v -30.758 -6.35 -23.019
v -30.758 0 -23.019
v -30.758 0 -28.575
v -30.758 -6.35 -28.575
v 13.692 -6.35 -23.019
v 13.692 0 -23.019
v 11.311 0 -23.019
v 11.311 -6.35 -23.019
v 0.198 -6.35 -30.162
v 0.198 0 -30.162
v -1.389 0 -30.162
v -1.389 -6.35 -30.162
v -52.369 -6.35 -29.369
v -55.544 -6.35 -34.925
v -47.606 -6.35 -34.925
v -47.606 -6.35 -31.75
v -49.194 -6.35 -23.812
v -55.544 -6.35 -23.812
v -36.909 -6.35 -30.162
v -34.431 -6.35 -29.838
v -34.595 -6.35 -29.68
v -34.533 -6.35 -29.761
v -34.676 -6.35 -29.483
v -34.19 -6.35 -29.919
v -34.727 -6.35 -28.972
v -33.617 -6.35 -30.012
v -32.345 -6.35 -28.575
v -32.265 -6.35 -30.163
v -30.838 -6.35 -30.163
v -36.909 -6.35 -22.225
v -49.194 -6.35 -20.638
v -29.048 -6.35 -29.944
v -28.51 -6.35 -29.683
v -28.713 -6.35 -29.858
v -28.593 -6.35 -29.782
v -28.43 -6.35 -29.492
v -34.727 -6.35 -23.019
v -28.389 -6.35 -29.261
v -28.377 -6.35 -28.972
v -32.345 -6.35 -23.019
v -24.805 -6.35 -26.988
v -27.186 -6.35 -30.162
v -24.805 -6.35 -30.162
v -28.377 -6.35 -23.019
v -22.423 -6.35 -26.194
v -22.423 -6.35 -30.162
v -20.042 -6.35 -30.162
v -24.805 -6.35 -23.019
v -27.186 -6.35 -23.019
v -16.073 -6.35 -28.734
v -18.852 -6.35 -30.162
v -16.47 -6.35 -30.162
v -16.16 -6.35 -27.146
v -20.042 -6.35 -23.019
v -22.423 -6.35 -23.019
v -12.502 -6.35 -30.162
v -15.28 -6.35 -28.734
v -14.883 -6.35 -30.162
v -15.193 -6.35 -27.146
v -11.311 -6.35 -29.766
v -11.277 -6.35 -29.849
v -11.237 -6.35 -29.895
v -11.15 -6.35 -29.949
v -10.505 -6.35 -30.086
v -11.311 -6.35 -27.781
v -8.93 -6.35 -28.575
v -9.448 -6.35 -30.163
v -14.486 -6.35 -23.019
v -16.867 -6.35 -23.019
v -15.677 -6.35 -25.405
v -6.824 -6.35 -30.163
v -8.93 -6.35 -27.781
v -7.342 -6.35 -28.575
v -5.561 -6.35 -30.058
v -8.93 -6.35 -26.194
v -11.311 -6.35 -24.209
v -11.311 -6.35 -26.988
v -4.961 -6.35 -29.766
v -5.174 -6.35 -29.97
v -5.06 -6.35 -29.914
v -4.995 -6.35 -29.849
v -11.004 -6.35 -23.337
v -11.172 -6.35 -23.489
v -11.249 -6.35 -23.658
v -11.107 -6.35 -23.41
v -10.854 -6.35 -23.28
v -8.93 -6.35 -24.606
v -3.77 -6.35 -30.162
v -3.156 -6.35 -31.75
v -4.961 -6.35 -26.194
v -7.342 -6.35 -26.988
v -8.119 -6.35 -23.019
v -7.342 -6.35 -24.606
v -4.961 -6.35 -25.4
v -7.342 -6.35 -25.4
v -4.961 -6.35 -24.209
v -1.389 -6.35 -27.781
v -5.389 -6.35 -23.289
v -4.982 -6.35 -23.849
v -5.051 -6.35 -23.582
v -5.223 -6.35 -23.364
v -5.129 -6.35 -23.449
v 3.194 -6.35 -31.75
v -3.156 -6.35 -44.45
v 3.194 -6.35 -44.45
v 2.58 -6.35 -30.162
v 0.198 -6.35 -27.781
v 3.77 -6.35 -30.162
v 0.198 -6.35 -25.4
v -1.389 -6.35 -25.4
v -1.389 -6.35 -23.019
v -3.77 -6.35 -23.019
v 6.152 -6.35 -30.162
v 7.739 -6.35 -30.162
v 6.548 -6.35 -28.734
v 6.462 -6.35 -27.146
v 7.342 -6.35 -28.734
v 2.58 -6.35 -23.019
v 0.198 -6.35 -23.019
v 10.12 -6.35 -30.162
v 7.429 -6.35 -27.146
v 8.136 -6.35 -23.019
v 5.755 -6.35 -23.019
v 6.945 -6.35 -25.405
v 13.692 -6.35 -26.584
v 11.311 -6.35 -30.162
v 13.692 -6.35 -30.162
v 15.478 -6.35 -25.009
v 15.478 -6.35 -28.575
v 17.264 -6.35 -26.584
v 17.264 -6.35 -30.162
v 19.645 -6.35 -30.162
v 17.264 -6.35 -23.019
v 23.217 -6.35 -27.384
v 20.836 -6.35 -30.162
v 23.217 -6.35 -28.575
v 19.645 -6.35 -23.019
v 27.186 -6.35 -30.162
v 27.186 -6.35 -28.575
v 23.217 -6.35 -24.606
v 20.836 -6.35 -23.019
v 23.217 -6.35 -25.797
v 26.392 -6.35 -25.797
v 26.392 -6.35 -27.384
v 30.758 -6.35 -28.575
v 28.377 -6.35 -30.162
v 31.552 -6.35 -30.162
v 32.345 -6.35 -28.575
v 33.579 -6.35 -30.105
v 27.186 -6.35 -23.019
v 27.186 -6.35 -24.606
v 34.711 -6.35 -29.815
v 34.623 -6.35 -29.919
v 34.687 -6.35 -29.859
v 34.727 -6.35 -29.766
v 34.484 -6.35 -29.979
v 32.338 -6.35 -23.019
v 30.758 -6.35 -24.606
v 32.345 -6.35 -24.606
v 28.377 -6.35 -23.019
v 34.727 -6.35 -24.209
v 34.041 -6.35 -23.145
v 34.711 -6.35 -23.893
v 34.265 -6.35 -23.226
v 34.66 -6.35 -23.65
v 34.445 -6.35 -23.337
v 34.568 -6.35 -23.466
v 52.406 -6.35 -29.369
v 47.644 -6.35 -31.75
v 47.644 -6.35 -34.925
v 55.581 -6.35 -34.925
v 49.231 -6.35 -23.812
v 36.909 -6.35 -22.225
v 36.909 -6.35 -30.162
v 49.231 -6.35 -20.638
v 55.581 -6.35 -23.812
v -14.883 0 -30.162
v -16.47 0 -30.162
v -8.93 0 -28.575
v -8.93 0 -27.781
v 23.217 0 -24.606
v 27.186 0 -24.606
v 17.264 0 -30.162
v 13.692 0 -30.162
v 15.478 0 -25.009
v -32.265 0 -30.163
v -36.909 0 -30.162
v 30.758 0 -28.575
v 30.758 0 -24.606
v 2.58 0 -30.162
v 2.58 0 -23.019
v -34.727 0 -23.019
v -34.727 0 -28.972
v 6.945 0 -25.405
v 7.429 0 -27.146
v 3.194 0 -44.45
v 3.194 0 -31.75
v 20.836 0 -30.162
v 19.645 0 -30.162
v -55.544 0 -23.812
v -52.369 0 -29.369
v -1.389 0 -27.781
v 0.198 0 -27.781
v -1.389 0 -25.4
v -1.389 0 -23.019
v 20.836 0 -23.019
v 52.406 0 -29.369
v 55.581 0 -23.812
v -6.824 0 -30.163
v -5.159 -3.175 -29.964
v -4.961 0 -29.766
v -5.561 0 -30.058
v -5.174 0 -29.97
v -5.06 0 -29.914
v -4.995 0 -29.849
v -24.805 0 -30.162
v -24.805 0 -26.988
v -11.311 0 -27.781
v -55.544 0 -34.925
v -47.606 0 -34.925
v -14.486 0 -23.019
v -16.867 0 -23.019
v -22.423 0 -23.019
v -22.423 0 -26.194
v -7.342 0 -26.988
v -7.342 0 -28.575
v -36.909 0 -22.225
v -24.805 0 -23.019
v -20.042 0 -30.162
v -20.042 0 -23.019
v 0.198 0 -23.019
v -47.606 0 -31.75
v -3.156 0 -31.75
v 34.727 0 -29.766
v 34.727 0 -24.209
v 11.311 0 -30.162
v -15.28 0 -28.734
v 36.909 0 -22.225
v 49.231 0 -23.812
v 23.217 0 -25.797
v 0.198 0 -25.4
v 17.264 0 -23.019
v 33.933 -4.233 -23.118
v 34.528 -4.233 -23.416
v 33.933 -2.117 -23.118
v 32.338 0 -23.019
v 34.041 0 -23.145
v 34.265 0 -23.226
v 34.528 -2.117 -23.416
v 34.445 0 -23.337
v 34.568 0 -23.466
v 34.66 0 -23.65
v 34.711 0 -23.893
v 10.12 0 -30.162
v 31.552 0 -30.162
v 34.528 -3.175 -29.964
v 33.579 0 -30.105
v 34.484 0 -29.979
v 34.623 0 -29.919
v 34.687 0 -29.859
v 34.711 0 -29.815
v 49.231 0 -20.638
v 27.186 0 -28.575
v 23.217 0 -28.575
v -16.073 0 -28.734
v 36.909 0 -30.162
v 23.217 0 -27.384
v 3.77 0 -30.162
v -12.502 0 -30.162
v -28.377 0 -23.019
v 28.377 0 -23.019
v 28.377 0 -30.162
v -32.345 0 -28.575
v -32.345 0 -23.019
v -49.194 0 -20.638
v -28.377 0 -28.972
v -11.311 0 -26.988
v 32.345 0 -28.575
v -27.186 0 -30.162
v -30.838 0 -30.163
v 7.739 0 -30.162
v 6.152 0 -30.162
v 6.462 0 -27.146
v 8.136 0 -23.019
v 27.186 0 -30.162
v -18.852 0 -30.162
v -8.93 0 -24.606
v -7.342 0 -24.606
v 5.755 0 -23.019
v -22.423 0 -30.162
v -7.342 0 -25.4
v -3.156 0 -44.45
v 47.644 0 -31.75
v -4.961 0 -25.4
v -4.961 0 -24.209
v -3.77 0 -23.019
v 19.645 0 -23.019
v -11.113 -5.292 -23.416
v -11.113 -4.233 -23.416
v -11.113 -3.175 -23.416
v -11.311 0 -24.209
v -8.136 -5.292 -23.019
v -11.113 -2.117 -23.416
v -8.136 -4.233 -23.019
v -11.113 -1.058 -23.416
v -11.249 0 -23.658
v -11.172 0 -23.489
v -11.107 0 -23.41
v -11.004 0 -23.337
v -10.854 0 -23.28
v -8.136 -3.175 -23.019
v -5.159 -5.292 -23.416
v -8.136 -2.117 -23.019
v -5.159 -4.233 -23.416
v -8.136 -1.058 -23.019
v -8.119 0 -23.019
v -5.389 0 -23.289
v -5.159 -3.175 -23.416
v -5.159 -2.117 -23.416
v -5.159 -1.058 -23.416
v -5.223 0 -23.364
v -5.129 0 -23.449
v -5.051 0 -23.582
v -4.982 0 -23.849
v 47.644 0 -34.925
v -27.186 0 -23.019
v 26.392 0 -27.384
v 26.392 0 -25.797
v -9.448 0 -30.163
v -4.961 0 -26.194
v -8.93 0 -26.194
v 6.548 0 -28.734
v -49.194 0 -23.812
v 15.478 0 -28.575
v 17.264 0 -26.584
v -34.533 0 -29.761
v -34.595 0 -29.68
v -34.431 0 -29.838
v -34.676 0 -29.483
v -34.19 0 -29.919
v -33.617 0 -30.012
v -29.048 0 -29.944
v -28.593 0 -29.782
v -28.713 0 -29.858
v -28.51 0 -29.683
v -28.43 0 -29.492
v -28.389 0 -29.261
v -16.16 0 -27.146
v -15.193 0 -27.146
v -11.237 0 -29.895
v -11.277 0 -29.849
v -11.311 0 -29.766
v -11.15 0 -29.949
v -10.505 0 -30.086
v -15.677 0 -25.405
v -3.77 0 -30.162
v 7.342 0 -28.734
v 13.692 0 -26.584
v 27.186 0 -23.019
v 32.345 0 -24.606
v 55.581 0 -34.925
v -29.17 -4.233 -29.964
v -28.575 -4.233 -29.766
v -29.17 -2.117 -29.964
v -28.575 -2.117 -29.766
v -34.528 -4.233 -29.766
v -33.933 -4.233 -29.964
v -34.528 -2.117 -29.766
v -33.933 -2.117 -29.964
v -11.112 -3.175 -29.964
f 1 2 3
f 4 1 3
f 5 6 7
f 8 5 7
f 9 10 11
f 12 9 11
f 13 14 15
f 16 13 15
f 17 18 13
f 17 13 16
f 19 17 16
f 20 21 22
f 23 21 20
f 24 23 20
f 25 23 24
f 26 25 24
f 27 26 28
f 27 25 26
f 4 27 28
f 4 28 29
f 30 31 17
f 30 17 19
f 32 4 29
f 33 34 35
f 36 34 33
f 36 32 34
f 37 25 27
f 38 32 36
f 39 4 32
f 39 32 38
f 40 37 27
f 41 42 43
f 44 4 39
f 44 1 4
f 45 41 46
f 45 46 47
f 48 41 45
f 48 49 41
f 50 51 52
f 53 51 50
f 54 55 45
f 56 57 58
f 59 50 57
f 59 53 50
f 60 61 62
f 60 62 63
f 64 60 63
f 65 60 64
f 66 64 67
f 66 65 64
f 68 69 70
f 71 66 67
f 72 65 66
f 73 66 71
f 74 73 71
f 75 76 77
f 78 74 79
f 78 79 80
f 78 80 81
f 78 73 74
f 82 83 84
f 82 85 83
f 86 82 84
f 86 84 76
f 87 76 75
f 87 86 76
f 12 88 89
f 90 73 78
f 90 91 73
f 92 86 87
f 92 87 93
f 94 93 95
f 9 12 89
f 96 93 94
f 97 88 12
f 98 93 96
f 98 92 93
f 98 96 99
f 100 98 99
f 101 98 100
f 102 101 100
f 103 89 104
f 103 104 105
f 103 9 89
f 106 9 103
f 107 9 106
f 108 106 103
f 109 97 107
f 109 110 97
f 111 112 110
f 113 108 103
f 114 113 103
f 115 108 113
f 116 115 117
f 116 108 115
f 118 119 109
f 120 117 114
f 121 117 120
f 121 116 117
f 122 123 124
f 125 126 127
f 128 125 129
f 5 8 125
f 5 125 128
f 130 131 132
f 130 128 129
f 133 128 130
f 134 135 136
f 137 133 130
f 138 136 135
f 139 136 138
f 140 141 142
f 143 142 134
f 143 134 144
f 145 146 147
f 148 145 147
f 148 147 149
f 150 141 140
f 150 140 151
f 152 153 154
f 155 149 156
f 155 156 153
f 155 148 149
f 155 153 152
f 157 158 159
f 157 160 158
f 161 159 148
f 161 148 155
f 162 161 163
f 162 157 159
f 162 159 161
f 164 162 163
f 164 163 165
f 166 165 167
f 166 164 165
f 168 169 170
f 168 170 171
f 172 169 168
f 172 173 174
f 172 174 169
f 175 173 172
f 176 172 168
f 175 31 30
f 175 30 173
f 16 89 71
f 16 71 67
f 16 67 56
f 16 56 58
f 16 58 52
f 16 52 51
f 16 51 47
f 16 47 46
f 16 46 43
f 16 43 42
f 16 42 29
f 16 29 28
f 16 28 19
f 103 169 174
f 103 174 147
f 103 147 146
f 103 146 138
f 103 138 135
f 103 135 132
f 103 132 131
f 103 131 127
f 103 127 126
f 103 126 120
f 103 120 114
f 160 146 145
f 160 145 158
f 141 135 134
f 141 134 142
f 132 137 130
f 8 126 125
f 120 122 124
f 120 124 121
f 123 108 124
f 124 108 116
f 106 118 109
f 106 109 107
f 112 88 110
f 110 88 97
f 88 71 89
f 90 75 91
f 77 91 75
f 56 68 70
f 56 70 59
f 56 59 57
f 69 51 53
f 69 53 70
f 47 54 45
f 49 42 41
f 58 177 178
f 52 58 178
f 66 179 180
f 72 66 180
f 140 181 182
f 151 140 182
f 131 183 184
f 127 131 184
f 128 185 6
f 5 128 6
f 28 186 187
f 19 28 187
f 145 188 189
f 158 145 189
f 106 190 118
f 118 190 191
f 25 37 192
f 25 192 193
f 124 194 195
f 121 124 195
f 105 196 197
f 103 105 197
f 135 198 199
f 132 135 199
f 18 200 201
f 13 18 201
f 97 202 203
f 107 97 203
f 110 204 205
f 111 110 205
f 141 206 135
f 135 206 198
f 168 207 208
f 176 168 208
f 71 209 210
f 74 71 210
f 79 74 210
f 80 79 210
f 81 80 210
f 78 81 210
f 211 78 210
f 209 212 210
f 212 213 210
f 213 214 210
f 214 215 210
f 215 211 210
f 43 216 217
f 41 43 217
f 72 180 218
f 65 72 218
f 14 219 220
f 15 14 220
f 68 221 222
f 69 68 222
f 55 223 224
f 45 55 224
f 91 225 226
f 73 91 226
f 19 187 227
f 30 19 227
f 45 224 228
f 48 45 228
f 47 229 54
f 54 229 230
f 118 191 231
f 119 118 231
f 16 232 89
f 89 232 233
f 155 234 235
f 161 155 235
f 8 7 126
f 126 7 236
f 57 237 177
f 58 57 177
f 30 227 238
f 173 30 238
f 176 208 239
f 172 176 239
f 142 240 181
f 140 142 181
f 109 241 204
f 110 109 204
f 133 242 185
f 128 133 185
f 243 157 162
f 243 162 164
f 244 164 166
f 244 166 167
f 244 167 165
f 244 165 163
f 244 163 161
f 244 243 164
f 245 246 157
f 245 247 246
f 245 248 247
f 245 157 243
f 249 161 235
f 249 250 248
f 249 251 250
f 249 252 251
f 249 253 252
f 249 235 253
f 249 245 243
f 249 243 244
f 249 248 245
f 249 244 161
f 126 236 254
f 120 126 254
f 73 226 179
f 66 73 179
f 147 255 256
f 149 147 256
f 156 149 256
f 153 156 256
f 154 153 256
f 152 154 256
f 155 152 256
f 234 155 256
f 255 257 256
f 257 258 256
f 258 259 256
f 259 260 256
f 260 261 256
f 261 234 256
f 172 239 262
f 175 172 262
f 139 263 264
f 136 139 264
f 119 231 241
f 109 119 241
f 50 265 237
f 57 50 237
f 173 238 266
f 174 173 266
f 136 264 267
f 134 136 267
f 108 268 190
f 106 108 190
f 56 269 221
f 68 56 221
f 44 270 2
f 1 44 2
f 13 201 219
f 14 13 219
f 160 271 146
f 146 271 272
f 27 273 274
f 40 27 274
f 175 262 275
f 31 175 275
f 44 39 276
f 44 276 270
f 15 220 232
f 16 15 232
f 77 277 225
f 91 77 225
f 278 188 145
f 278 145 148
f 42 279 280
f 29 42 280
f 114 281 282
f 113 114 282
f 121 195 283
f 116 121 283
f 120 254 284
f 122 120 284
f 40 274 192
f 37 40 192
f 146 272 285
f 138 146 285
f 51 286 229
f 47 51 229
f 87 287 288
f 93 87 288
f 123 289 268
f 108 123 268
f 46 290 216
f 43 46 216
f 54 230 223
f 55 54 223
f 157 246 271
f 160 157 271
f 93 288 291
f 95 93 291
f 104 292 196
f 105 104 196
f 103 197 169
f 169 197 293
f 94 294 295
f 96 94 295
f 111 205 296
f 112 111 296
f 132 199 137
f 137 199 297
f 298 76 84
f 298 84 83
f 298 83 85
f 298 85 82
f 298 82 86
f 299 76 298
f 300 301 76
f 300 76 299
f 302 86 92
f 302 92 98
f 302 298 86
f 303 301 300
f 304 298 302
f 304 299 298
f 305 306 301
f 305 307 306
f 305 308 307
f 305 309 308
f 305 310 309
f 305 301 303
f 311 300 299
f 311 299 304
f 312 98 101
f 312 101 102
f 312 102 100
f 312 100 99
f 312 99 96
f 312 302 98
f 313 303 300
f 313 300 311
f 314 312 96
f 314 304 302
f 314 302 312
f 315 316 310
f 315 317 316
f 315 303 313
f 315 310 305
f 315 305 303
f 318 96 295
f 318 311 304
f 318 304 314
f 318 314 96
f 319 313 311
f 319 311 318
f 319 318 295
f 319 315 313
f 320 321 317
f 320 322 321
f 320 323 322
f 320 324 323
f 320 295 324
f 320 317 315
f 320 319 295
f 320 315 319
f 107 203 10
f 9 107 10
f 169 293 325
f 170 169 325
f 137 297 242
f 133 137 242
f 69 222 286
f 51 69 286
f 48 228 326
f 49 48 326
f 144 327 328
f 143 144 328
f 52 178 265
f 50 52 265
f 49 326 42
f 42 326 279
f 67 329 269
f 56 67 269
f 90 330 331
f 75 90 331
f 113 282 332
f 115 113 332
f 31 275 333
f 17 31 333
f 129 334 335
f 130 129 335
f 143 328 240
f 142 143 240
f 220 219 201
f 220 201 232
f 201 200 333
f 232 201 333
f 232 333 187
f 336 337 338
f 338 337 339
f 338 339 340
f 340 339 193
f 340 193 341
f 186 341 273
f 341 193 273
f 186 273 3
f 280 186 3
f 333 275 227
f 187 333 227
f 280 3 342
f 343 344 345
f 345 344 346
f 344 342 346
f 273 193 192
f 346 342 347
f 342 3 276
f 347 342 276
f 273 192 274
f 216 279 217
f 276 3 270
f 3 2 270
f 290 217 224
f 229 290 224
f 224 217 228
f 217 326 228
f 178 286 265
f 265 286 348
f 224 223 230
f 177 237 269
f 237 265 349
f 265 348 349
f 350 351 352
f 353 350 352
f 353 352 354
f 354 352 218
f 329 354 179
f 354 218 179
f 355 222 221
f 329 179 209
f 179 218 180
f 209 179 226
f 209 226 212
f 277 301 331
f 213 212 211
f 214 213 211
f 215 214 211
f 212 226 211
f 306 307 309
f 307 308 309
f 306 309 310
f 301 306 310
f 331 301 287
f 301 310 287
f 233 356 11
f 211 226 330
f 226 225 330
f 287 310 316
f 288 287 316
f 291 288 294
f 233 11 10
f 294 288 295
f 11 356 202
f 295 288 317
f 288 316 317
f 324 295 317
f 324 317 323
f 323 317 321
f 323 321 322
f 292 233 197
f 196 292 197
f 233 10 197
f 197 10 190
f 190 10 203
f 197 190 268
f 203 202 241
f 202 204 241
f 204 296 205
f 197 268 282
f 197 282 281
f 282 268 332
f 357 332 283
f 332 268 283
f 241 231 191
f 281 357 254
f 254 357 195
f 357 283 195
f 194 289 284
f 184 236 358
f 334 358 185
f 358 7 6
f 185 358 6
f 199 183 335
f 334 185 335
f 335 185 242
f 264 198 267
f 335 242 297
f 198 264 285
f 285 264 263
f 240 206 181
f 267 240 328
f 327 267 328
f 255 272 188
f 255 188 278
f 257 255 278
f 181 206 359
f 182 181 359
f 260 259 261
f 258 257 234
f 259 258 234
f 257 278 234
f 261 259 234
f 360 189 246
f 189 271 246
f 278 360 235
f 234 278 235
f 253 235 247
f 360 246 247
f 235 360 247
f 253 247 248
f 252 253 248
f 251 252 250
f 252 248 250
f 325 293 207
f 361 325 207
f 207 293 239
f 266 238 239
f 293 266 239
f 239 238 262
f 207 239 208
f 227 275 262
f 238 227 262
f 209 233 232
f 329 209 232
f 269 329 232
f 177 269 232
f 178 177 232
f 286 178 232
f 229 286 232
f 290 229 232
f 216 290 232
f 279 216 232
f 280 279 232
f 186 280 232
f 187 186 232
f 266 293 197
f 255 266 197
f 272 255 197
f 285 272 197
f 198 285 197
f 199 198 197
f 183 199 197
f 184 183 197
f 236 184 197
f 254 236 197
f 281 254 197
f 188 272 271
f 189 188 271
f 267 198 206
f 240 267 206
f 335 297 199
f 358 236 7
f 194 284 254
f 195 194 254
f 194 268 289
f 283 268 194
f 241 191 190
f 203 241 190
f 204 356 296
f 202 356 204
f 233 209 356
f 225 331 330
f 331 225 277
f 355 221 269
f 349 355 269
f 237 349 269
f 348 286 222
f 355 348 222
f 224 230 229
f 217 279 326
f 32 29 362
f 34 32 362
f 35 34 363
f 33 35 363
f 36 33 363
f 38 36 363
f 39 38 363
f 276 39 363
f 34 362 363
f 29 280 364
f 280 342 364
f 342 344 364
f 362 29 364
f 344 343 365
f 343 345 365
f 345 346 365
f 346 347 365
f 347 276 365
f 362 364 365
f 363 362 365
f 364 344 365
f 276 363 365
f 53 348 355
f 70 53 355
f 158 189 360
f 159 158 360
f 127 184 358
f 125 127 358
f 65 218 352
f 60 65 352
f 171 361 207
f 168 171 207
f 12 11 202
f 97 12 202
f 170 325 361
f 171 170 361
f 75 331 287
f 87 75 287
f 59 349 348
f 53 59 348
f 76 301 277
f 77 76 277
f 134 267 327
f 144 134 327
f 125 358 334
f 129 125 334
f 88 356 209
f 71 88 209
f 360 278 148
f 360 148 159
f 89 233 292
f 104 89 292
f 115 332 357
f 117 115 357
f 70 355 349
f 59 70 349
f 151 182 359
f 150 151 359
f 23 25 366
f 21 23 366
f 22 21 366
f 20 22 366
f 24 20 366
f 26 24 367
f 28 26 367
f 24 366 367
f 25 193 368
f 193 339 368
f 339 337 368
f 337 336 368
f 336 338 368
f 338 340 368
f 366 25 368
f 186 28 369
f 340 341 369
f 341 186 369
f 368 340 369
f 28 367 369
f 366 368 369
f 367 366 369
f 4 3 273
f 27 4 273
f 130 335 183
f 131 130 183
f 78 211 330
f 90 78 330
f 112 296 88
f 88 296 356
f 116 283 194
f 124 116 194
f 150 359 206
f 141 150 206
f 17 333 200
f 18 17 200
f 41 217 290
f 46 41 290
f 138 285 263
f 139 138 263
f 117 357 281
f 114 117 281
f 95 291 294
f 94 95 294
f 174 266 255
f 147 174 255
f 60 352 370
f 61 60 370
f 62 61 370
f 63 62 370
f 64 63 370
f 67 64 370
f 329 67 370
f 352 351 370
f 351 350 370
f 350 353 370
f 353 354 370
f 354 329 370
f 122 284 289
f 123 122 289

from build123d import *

# Parameters (mm, degrees)
F0_W     = 6.35
F0_H     = 9.525
F0_W_2   = 1.5875
F0_H_2   = 3.96875
F0_H_3   = 3.175
F1_DEPTH = 6.35


# Not quite as in the source:
# - a length typed as a fraction of an inch, garbled in the dataset ("3 / 203.2 mm" for 3/8 in), is restored


with BuildPart() as f1:
    # F0 (on Front) → F1 (new body)
    with BuildSketch(Plane.XZ):
        Polygon((52.4060167908, -29.36875), (55.5810167908, -23.8125), (49.2310167908, -23.8125), (49.2310167908, -20.6375), (-49.1939832092, -20.6375), (-49.1939832092, -23.8125), (-55.5439832092, -23.8125), (-52.3689832092, -29.36875), (-55.5439832092, -34.925), (-47.6064832092, -34.925), (-47.6064832092, -31.75), (-3.1564832092, -31.75), (3.1935167908, -31.75), (47.6435167908, -31.75), (47.6435167908, -34.925), (55.5810167908, -34.925), align=None)
        with BuildLine():
            Line((-36.909375, -22.225), (36.909375, -22.225))
            Line((36.909375, -22.225), (36.909375, -30.1625))
            Line((36.909375, -30.1625), (34.7265625, -30.1625))
            Line((34.7265625, -30.1625), (31.5515625, -30.1625))
            Line((31.5515625, -30.1625), (28.3765625, -30.1625))
            Line((28.3765625, -30.1625), (27.1859375, -30.1625))
            Line((27.1859375, -30.1625), (20.8359375, -30.1625))
            Line((20.8359375, -30.1625), (19.6453125, -30.1625))
            Line((19.6453125, -30.1625), (17.2640625, -30.1625))
            Line((17.2640625, -30.1625), (13.6921875, -30.1625))
            Line((13.6921875, -30.1625), (11.3109375, -30.1625))
            Line((11.3109375, -30.1625), (10.1203125, -30.1625))
            Line((10.1203125, -30.1625), (7.7390625, -30.1625))
            Line((7.7390625, -30.1625), (6.1515625, -30.1625))
            Line((6.1515625, -30.1625), (3.7703125, -30.1625))
            Line((3.7703125, -30.1625), (2.5796875, -30.1625))
            Line((2.5796875, -30.1625), (0.1984375, -30.1625))
            Line((0.1984375, -30.1625), (-1.3890625, -30.1625))
            Line((-1.3890625, -30.1625), (-3.7703125, -30.1625))
            Line((-3.7703125, -30.1625), (-4.9609375, -30.1625))
            Line((-4.9609375, -30.1625), (-6.8241157772, -30.1625))
            add(Edge.make_bspline(
                [(-8.1359375, -30.1873046875), (-7.6862010464, -30.1873046875), (-7.2364645928, -30.1795465798), (-6.8241157772, -30.1625)],
                knots=[0.5, 0.5, 0.5, 0.5, 0.5965188889, 0.5965188889, 0.5965188889, 0.5965188889], degree=3))
            add(Edge.make_bspline(
                [(-9.4477592243, -30.1625), (-9.0354104083, -30.1795465799), (-8.5856739541, -30.1873046875), (-8.1359375, -30.1873046875)],
                knots=[0.403481111, 0.403481111, 0.403481111, 0.403481111, 0.5, 0.5, 0.5, 0.5], degree=3))
            Line((-9.4477592243, -30.1625), (-11.3109375, -30.1625))
            Line((-11.3109375, -30.1625), (-12.5015625, -30.1625))
            Line((-12.5015625, -30.1625), (-14.8828125, -30.1625))
            Line((-14.8828125, -30.1625), (-16.4703125, -30.1625))
            Line((-16.4703125, -30.1625), (-18.8515625, -30.1625))
            Line((-18.8515625, -30.1625), (-20.0421875, -30.1625))
            Line((-20.0421875, -30.1625), (-22.4234375, -30.1625))
            Line((-22.4234375, -30.1625), (-24.8046875, -30.1625))
            Line((-24.8046875, -30.1625), (-27.1859375, -30.1625))
            Line((-27.1859375, -30.1625), (-28.3765625, -30.1625))
            Line((-28.3765625, -30.1625), (-30.8380988479, -30.1625))
            add(Edge.make_bspline(
                [(-31.5515625, -30.1873046875), (-31.3115619086, -30.1873046875), (-31.0715613172, -30.1779187981), (-30.8380988479, -30.1625)],
                knots=[0.5, 0.5, 0.5, 0.5, 0.5625917967, 0.5625917967, 0.5625917967, 0.5625917967], degree=3))
            add(Edge.make_bspline(
                [(-32.2650261503, -30.1625), (-32.0315636815, -30.177918798), (-31.7915630907, -30.1873046875), (-31.5515625, -30.1873046875)],
                knots=[0.4374082034, 0.4374082034, 0.4374082034, 0.4374082034, 0.5, 0.5, 0.5, 0.5], degree=3))
            Line((-32.2650261503, -30.1625), (-34.7265625, -30.1625))
            Line((-34.7265625, -30.1625), (-36.909375, -30.1625))
            Line((-36.909375, -30.1625), (-36.909375, -22.225))
        make_face(mode=Mode.SUBTRACT)
        with Locations((0.0185167908, -39.6875)):
            Rectangle(F0_W, F0_H)
        Polygon((17.2640625, -30.1625), (19.6453125, -30.1625), (19.6453125, -23.01875), (17.2640625, -23.01875), (15.478125, -25.0092855764), (13.6921875, -23.01875), (11.3109375, -23.01875), (11.3109375, -30.1625), (13.6921875, -30.1625), (13.6921875, -26.5844644236), (15.478125, -28.575), (17.2640625, -26.5844644236), align=None)
        with BuildLine():
            Line((28.3765625, -30.1625), (31.5515625, -30.1625))
            add(Edge.make_bspline(
                [(31.5515625, -30.1625), (32.7421875004, -30.1591077376), (34.5123349703, -30.1090597393), (34.7058178423, -29.8567694785), (34.7265625, -29.765625)],
                knots=[0, 0, 0, 0, 0.5486856078, 0.7169739211, 0.7169739211, 0.7169739211, 0.7169739211], degree=3))
            Line((34.7265625, -29.765625), (34.7265625, -28.971875))
            Line((34.7265625, -28.971875), (34.7265625, -24.209375))
            add(Edge.make_bspline(
                [(32.338456939, -23.01875), (33.0698998056, -23.0207151841), (33.9016308923, -23.0447678149), (34.6240389102, -23.3694667004), (34.7265625, -23.8125000002), (34.7265625, -24.209375)],
                knots=[0.1152880959, 0.1152880959, 0.1152880959, 0.1152880959, 0.4729542068, 0.722889892, 1, 1, 1, 1], degree=3))
            Line((32.338456939, -23.01875), (31.5515625, -23.01875))
            Line((31.5515625, -23.01875), (28.3765625, -23.01875))
            Line((28.3765625, -23.01875), (28.3765625, -30.1625))
        make_face()
        with Locations((31.5515625, -26.590625)):
            Rectangle(F0_W_2, F0_H_2, mode=Mode.SUBTRACT)
        Polygon((-27.1859375, -23.01875), (-27.1859375, -30.1625), (-24.8046875, -30.1625), (-24.8046875, -26.9875), (-22.4234375, -30.1625), (-20.0421875, -30.1625), (-20.0421875, -23.01875), (-22.4234375, -23.01875), (-22.4234375, -26.19375), (-24.8046875, -23.01875), align=None)
        Polygon((0.1984375, -30.1625), (2.5796875, -30.1625), (2.5796875, -23.01875), (0.1984375, -23.01875), (0.1984375, -25.4), (-1.3890625, -25.4), (-1.3890625, -23.01875), (-3.7703125, -23.01875), (-3.7703125, -30.1625), (-1.3890625, -30.1625), (-1.3890625, -27.78125), (0.1984375, -27.78125), align=None)
        with BuildLine():
            add(Edge.make_bspline(
                [(-34.7265625, -28.971875), (-34.7265625, -29.3687499998), (-34.6194398399, -29.8515743848), (-33.9447907089, -29.9651114553), (-32.920864157, -30.119185827), (-32.2650261503, -30.1625)],
                knots=[0, 0, 0, 0, 0.139450599, 0.2615766049, 0.4374082034, 0.4374082034, 0.4374082034, 0.4374082034], degree=3))
            Line((-32.2650261503, -30.1625), (-31.5515625, -30.1625))
            Line((-31.5515625, -30.1625), (-30.8380988479, -30.1625))
            add(Edge.make_bspline(
                [(-30.8380988479, -30.1625), (-30.1822608419, -30.119185827), (-29.1583342909, -29.9651114555), (-28.4836851601, -29.851574384), (-28.3765625, -29.3687500019), (-28.3765625, -28.971875)],
                knots=[0.5625917967, 0.5625917967, 0.5625917967, 0.5625917967, 0.7384233951, 0.860549401, 1, 1, 1, 1], degree=3))
            Line((-28.3765625, -28.971875), (-28.3765625, -23.01875))
            Line((-28.3765625, -23.01875), (-30.7578125, -23.01875))
            Line((-30.7578125, -23.01875), (-30.7578125, -28.575))
            Line((-30.7578125, -28.575), (-32.3453125, -28.575))
            Line((-32.3453125, -28.575), (-32.3453125, -23.01875))
            Line((-32.3453125, -23.01875), (-34.7265625, -23.01875))
            Line((-34.7265625, -23.01875), (-34.7265625, -28.971875))
        make_face()
        with BuildLine():
            add(Edge.make_bspline(
                [(-11.3109375, -29.765625), (-11.2890563147, -29.8564083098), (-11.1398834343, -30.0383555662), (-10.2076153949, -30.1310873988), (-9.4477592243, -30.1625)],
                knots=[0.1414902381, 0.1414902381, 0.1414902381, 0.1414902381, 0.2256208371, 0.403481111, 0.403481111, 0.403481111, 0.403481111], degree=3))
            Line((-9.4477592243, -30.1625), (-8.1359375, -30.1625))
            Line((-8.1359375, -30.1625), (-6.8241157772, -30.1625))
            add(Edge.make_bspline(
                [(-6.8241157772, -30.1625), (-6.0642596059, -30.1310873988), (-5.1319915657, -30.0383555662), (-4.9828186853, -29.8564083099), (-4.9609375, -29.765625)],
                knots=[0.5965188889, 0.5965188889, 0.5965188889, 0.5965188889, 0.7743791629, 0.8585097619, 0.8585097619, 0.8585097619, 0.8585097619], degree=3))
            Line((-4.9609375, -29.765625), (-4.9609375, -28.971875))
            Line((-4.9609375, -28.971875), (-4.9609375, -26.19375))
            Line((-4.9609375, -26.19375), (-8.9296875, -26.19375))
            Line((-8.9296875, -26.19375), (-8.9296875, -24.60625))
            Line((-8.9296875, -24.60625), (-7.3421875, -24.60625))
            Line((-7.3421875, -24.60625), (-7.3421875, -25.4))
            Line((-7.3421875, -25.4), (-4.9609375, -25.4))
            Line((-4.9609375, -25.4), (-4.9609375, -24.209375))
            add(Edge.make_bspline(
                [(-8.1359375, -23.01875), (-7.2216783904, -23.0187499999), (-5.8389001857, -23.1942073937), (-5.0681026979, -23.3310171279), (-4.9609375, -23.8124999986), (-4.9609375, -24.209375)],
                knots=[0.5, 0.5, 0.5, 0.5, 0.738366324, 0.8605189755, 1, 1, 1, 1], degree=3))
            add(Edge.make_bspline(
                [(-11.3109375, -24.209375), (-11.3109375, -23.8125000002), (-11.2037723021, -23.3310171272), (-10.4329748143, -23.194207394), (-9.0501966096, -23.0187500001), (-8.1359375, -23.01875)],
                knots=[0, 0, 0, 0, 0.1394810245, 0.261633676, 0.5, 0.5, 0.5, 0.5], degree=3))
            Line((-11.3109375, -24.209375), (-11.3109375, -26.9875))
            Line((-11.3109375, -26.9875), (-7.3421875, -26.9875))
            Line((-7.3421875, -26.9875), (-7.3421875, -28.575))
            Line((-7.3421875, -28.575), (-8.9296875, -28.575))
            Line((-8.9296875, -28.575), (-8.9296875, -27.78125))
            Line((-8.9296875, -27.78125), (-11.3109375, -27.78125))
            Line((-11.3109375, -27.78125), (-11.3109375, -28.971875))
            Line((-11.3109375, -28.971875), (-11.3109375, -29.765625))
        make_face()
        Polygon((20.8359375, -30.1625), (27.1859375, -30.1625), (27.1859375, -28.575), (23.2171875, -28.575), (23.2171875, -27.384375), (26.3921875, -27.384375), (26.3921875, -25.796875), (23.2171875, -25.796875), (23.2171875, -24.60625), (27.1859375, -24.60625), (27.1859375, -23.01875), (20.8359375, -23.01875), align=None)
        Polygon((-16.8671875, -23.01875), (-18.8515625, -30.1625), (-16.4703125, -30.1625), (-16.0734375, -28.73375), (-15.2796875, -28.73375), (-14.8828125, -30.1625), (-12.5015625, -30.1625), (-14.4859375, -23.01875), align=None)
        Polygon((-16.160156063, -27.14625), (-15.6765625, -25.4053131732), (-15.192968937, -27.14625), align=None, mode=Mode.SUBTRACT)
        Polygon((7.7390625, -30.1625), (10.1203125, -30.1625), (8.1359375, -23.01875), (5.7546875, -23.01875), (3.7703125, -30.1625), (6.1515625, -30.1625), (6.5484375, -28.73375), (7.3421875, -28.73375), align=None)
        Polygon((6.461718937, -27.14625), (6.9453125, -25.4053131732), (7.428906063, -27.14625), align=None, mode=Mode.SUBTRACT)
        with Locations((0.0185167908, -33.3375)):
            Rectangle(F0_W, F0_H_3)
        with BuildLine():
            Line((-8.1359375, -30.1625), (-9.4477592243, -30.1625))
            add(Edge.make_bspline(
                [(-9.4477592243, -30.1625), (-9.0354104083, -30.1795465799), (-8.5856739541, -30.1873046875), (-8.1359375, -30.1873046875)],
                knots=[0.403481111, 0.403481111, 0.403481111, 0.403481111, 0.5, 0.5, 0.5, 0.5], degree=3))
            Line((-8.1359375, -30.1873046875), (-8.1359375, -30.1625))
        make_face()
        with BuildLine():
            Line((-6.8241157772, -30.1625), (-8.1359375, -30.1625))
            Line((-8.1359375, -30.1625), (-8.1359375, -30.1873046875))
            add(Edge.make_bspline(
                [(-8.1359375, -30.1873046875), (-7.6862010464, -30.1873046875), (-7.2364645928, -30.1795465798), (-6.8241157772, -30.1625)],
                knots=[0.5, 0.5, 0.5, 0.5, 0.5965188889, 0.5965188889, 0.5965188889, 0.5965188889], degree=3))
        make_face()
        with BuildLine():
            Line((-31.5515625, -30.1625), (-32.2650261503, -30.1625))
            add(Edge.make_bspline(
                [(-32.2650261503, -30.1625), (-32.0315636815, -30.177918798), (-31.7915630907, -30.1873046875), (-31.5515625, -30.1873046875)],
                knots=[0.4374082034, 0.4374082034, 0.4374082034, 0.4374082034, 0.5, 0.5, 0.5, 0.5], degree=3))
            Line((-31.5515625, -30.1873046875), (-31.5515625, -30.1625))
        make_face()
        with BuildLine():
            Line((-30.8380988479, -30.1625), (-31.5515625, -30.1625))
            Line((-31.5515625, -30.1625), (-31.5515625, -30.1873046875))
            add(Edge.make_bspline(
                [(-31.5515625, -30.1873046875), (-31.3115619086, -30.1873046875), (-31.0715613172, -30.1779187981), (-30.8380988479, -30.1625)],
                knots=[0.5, 0.5, 0.5, 0.5, 0.5625917967, 0.5625917967, 0.5625917967, 0.5625917967], degree=3))
        make_face()
    extrude(amount=F1_DEPTH)


solid = f1.part
